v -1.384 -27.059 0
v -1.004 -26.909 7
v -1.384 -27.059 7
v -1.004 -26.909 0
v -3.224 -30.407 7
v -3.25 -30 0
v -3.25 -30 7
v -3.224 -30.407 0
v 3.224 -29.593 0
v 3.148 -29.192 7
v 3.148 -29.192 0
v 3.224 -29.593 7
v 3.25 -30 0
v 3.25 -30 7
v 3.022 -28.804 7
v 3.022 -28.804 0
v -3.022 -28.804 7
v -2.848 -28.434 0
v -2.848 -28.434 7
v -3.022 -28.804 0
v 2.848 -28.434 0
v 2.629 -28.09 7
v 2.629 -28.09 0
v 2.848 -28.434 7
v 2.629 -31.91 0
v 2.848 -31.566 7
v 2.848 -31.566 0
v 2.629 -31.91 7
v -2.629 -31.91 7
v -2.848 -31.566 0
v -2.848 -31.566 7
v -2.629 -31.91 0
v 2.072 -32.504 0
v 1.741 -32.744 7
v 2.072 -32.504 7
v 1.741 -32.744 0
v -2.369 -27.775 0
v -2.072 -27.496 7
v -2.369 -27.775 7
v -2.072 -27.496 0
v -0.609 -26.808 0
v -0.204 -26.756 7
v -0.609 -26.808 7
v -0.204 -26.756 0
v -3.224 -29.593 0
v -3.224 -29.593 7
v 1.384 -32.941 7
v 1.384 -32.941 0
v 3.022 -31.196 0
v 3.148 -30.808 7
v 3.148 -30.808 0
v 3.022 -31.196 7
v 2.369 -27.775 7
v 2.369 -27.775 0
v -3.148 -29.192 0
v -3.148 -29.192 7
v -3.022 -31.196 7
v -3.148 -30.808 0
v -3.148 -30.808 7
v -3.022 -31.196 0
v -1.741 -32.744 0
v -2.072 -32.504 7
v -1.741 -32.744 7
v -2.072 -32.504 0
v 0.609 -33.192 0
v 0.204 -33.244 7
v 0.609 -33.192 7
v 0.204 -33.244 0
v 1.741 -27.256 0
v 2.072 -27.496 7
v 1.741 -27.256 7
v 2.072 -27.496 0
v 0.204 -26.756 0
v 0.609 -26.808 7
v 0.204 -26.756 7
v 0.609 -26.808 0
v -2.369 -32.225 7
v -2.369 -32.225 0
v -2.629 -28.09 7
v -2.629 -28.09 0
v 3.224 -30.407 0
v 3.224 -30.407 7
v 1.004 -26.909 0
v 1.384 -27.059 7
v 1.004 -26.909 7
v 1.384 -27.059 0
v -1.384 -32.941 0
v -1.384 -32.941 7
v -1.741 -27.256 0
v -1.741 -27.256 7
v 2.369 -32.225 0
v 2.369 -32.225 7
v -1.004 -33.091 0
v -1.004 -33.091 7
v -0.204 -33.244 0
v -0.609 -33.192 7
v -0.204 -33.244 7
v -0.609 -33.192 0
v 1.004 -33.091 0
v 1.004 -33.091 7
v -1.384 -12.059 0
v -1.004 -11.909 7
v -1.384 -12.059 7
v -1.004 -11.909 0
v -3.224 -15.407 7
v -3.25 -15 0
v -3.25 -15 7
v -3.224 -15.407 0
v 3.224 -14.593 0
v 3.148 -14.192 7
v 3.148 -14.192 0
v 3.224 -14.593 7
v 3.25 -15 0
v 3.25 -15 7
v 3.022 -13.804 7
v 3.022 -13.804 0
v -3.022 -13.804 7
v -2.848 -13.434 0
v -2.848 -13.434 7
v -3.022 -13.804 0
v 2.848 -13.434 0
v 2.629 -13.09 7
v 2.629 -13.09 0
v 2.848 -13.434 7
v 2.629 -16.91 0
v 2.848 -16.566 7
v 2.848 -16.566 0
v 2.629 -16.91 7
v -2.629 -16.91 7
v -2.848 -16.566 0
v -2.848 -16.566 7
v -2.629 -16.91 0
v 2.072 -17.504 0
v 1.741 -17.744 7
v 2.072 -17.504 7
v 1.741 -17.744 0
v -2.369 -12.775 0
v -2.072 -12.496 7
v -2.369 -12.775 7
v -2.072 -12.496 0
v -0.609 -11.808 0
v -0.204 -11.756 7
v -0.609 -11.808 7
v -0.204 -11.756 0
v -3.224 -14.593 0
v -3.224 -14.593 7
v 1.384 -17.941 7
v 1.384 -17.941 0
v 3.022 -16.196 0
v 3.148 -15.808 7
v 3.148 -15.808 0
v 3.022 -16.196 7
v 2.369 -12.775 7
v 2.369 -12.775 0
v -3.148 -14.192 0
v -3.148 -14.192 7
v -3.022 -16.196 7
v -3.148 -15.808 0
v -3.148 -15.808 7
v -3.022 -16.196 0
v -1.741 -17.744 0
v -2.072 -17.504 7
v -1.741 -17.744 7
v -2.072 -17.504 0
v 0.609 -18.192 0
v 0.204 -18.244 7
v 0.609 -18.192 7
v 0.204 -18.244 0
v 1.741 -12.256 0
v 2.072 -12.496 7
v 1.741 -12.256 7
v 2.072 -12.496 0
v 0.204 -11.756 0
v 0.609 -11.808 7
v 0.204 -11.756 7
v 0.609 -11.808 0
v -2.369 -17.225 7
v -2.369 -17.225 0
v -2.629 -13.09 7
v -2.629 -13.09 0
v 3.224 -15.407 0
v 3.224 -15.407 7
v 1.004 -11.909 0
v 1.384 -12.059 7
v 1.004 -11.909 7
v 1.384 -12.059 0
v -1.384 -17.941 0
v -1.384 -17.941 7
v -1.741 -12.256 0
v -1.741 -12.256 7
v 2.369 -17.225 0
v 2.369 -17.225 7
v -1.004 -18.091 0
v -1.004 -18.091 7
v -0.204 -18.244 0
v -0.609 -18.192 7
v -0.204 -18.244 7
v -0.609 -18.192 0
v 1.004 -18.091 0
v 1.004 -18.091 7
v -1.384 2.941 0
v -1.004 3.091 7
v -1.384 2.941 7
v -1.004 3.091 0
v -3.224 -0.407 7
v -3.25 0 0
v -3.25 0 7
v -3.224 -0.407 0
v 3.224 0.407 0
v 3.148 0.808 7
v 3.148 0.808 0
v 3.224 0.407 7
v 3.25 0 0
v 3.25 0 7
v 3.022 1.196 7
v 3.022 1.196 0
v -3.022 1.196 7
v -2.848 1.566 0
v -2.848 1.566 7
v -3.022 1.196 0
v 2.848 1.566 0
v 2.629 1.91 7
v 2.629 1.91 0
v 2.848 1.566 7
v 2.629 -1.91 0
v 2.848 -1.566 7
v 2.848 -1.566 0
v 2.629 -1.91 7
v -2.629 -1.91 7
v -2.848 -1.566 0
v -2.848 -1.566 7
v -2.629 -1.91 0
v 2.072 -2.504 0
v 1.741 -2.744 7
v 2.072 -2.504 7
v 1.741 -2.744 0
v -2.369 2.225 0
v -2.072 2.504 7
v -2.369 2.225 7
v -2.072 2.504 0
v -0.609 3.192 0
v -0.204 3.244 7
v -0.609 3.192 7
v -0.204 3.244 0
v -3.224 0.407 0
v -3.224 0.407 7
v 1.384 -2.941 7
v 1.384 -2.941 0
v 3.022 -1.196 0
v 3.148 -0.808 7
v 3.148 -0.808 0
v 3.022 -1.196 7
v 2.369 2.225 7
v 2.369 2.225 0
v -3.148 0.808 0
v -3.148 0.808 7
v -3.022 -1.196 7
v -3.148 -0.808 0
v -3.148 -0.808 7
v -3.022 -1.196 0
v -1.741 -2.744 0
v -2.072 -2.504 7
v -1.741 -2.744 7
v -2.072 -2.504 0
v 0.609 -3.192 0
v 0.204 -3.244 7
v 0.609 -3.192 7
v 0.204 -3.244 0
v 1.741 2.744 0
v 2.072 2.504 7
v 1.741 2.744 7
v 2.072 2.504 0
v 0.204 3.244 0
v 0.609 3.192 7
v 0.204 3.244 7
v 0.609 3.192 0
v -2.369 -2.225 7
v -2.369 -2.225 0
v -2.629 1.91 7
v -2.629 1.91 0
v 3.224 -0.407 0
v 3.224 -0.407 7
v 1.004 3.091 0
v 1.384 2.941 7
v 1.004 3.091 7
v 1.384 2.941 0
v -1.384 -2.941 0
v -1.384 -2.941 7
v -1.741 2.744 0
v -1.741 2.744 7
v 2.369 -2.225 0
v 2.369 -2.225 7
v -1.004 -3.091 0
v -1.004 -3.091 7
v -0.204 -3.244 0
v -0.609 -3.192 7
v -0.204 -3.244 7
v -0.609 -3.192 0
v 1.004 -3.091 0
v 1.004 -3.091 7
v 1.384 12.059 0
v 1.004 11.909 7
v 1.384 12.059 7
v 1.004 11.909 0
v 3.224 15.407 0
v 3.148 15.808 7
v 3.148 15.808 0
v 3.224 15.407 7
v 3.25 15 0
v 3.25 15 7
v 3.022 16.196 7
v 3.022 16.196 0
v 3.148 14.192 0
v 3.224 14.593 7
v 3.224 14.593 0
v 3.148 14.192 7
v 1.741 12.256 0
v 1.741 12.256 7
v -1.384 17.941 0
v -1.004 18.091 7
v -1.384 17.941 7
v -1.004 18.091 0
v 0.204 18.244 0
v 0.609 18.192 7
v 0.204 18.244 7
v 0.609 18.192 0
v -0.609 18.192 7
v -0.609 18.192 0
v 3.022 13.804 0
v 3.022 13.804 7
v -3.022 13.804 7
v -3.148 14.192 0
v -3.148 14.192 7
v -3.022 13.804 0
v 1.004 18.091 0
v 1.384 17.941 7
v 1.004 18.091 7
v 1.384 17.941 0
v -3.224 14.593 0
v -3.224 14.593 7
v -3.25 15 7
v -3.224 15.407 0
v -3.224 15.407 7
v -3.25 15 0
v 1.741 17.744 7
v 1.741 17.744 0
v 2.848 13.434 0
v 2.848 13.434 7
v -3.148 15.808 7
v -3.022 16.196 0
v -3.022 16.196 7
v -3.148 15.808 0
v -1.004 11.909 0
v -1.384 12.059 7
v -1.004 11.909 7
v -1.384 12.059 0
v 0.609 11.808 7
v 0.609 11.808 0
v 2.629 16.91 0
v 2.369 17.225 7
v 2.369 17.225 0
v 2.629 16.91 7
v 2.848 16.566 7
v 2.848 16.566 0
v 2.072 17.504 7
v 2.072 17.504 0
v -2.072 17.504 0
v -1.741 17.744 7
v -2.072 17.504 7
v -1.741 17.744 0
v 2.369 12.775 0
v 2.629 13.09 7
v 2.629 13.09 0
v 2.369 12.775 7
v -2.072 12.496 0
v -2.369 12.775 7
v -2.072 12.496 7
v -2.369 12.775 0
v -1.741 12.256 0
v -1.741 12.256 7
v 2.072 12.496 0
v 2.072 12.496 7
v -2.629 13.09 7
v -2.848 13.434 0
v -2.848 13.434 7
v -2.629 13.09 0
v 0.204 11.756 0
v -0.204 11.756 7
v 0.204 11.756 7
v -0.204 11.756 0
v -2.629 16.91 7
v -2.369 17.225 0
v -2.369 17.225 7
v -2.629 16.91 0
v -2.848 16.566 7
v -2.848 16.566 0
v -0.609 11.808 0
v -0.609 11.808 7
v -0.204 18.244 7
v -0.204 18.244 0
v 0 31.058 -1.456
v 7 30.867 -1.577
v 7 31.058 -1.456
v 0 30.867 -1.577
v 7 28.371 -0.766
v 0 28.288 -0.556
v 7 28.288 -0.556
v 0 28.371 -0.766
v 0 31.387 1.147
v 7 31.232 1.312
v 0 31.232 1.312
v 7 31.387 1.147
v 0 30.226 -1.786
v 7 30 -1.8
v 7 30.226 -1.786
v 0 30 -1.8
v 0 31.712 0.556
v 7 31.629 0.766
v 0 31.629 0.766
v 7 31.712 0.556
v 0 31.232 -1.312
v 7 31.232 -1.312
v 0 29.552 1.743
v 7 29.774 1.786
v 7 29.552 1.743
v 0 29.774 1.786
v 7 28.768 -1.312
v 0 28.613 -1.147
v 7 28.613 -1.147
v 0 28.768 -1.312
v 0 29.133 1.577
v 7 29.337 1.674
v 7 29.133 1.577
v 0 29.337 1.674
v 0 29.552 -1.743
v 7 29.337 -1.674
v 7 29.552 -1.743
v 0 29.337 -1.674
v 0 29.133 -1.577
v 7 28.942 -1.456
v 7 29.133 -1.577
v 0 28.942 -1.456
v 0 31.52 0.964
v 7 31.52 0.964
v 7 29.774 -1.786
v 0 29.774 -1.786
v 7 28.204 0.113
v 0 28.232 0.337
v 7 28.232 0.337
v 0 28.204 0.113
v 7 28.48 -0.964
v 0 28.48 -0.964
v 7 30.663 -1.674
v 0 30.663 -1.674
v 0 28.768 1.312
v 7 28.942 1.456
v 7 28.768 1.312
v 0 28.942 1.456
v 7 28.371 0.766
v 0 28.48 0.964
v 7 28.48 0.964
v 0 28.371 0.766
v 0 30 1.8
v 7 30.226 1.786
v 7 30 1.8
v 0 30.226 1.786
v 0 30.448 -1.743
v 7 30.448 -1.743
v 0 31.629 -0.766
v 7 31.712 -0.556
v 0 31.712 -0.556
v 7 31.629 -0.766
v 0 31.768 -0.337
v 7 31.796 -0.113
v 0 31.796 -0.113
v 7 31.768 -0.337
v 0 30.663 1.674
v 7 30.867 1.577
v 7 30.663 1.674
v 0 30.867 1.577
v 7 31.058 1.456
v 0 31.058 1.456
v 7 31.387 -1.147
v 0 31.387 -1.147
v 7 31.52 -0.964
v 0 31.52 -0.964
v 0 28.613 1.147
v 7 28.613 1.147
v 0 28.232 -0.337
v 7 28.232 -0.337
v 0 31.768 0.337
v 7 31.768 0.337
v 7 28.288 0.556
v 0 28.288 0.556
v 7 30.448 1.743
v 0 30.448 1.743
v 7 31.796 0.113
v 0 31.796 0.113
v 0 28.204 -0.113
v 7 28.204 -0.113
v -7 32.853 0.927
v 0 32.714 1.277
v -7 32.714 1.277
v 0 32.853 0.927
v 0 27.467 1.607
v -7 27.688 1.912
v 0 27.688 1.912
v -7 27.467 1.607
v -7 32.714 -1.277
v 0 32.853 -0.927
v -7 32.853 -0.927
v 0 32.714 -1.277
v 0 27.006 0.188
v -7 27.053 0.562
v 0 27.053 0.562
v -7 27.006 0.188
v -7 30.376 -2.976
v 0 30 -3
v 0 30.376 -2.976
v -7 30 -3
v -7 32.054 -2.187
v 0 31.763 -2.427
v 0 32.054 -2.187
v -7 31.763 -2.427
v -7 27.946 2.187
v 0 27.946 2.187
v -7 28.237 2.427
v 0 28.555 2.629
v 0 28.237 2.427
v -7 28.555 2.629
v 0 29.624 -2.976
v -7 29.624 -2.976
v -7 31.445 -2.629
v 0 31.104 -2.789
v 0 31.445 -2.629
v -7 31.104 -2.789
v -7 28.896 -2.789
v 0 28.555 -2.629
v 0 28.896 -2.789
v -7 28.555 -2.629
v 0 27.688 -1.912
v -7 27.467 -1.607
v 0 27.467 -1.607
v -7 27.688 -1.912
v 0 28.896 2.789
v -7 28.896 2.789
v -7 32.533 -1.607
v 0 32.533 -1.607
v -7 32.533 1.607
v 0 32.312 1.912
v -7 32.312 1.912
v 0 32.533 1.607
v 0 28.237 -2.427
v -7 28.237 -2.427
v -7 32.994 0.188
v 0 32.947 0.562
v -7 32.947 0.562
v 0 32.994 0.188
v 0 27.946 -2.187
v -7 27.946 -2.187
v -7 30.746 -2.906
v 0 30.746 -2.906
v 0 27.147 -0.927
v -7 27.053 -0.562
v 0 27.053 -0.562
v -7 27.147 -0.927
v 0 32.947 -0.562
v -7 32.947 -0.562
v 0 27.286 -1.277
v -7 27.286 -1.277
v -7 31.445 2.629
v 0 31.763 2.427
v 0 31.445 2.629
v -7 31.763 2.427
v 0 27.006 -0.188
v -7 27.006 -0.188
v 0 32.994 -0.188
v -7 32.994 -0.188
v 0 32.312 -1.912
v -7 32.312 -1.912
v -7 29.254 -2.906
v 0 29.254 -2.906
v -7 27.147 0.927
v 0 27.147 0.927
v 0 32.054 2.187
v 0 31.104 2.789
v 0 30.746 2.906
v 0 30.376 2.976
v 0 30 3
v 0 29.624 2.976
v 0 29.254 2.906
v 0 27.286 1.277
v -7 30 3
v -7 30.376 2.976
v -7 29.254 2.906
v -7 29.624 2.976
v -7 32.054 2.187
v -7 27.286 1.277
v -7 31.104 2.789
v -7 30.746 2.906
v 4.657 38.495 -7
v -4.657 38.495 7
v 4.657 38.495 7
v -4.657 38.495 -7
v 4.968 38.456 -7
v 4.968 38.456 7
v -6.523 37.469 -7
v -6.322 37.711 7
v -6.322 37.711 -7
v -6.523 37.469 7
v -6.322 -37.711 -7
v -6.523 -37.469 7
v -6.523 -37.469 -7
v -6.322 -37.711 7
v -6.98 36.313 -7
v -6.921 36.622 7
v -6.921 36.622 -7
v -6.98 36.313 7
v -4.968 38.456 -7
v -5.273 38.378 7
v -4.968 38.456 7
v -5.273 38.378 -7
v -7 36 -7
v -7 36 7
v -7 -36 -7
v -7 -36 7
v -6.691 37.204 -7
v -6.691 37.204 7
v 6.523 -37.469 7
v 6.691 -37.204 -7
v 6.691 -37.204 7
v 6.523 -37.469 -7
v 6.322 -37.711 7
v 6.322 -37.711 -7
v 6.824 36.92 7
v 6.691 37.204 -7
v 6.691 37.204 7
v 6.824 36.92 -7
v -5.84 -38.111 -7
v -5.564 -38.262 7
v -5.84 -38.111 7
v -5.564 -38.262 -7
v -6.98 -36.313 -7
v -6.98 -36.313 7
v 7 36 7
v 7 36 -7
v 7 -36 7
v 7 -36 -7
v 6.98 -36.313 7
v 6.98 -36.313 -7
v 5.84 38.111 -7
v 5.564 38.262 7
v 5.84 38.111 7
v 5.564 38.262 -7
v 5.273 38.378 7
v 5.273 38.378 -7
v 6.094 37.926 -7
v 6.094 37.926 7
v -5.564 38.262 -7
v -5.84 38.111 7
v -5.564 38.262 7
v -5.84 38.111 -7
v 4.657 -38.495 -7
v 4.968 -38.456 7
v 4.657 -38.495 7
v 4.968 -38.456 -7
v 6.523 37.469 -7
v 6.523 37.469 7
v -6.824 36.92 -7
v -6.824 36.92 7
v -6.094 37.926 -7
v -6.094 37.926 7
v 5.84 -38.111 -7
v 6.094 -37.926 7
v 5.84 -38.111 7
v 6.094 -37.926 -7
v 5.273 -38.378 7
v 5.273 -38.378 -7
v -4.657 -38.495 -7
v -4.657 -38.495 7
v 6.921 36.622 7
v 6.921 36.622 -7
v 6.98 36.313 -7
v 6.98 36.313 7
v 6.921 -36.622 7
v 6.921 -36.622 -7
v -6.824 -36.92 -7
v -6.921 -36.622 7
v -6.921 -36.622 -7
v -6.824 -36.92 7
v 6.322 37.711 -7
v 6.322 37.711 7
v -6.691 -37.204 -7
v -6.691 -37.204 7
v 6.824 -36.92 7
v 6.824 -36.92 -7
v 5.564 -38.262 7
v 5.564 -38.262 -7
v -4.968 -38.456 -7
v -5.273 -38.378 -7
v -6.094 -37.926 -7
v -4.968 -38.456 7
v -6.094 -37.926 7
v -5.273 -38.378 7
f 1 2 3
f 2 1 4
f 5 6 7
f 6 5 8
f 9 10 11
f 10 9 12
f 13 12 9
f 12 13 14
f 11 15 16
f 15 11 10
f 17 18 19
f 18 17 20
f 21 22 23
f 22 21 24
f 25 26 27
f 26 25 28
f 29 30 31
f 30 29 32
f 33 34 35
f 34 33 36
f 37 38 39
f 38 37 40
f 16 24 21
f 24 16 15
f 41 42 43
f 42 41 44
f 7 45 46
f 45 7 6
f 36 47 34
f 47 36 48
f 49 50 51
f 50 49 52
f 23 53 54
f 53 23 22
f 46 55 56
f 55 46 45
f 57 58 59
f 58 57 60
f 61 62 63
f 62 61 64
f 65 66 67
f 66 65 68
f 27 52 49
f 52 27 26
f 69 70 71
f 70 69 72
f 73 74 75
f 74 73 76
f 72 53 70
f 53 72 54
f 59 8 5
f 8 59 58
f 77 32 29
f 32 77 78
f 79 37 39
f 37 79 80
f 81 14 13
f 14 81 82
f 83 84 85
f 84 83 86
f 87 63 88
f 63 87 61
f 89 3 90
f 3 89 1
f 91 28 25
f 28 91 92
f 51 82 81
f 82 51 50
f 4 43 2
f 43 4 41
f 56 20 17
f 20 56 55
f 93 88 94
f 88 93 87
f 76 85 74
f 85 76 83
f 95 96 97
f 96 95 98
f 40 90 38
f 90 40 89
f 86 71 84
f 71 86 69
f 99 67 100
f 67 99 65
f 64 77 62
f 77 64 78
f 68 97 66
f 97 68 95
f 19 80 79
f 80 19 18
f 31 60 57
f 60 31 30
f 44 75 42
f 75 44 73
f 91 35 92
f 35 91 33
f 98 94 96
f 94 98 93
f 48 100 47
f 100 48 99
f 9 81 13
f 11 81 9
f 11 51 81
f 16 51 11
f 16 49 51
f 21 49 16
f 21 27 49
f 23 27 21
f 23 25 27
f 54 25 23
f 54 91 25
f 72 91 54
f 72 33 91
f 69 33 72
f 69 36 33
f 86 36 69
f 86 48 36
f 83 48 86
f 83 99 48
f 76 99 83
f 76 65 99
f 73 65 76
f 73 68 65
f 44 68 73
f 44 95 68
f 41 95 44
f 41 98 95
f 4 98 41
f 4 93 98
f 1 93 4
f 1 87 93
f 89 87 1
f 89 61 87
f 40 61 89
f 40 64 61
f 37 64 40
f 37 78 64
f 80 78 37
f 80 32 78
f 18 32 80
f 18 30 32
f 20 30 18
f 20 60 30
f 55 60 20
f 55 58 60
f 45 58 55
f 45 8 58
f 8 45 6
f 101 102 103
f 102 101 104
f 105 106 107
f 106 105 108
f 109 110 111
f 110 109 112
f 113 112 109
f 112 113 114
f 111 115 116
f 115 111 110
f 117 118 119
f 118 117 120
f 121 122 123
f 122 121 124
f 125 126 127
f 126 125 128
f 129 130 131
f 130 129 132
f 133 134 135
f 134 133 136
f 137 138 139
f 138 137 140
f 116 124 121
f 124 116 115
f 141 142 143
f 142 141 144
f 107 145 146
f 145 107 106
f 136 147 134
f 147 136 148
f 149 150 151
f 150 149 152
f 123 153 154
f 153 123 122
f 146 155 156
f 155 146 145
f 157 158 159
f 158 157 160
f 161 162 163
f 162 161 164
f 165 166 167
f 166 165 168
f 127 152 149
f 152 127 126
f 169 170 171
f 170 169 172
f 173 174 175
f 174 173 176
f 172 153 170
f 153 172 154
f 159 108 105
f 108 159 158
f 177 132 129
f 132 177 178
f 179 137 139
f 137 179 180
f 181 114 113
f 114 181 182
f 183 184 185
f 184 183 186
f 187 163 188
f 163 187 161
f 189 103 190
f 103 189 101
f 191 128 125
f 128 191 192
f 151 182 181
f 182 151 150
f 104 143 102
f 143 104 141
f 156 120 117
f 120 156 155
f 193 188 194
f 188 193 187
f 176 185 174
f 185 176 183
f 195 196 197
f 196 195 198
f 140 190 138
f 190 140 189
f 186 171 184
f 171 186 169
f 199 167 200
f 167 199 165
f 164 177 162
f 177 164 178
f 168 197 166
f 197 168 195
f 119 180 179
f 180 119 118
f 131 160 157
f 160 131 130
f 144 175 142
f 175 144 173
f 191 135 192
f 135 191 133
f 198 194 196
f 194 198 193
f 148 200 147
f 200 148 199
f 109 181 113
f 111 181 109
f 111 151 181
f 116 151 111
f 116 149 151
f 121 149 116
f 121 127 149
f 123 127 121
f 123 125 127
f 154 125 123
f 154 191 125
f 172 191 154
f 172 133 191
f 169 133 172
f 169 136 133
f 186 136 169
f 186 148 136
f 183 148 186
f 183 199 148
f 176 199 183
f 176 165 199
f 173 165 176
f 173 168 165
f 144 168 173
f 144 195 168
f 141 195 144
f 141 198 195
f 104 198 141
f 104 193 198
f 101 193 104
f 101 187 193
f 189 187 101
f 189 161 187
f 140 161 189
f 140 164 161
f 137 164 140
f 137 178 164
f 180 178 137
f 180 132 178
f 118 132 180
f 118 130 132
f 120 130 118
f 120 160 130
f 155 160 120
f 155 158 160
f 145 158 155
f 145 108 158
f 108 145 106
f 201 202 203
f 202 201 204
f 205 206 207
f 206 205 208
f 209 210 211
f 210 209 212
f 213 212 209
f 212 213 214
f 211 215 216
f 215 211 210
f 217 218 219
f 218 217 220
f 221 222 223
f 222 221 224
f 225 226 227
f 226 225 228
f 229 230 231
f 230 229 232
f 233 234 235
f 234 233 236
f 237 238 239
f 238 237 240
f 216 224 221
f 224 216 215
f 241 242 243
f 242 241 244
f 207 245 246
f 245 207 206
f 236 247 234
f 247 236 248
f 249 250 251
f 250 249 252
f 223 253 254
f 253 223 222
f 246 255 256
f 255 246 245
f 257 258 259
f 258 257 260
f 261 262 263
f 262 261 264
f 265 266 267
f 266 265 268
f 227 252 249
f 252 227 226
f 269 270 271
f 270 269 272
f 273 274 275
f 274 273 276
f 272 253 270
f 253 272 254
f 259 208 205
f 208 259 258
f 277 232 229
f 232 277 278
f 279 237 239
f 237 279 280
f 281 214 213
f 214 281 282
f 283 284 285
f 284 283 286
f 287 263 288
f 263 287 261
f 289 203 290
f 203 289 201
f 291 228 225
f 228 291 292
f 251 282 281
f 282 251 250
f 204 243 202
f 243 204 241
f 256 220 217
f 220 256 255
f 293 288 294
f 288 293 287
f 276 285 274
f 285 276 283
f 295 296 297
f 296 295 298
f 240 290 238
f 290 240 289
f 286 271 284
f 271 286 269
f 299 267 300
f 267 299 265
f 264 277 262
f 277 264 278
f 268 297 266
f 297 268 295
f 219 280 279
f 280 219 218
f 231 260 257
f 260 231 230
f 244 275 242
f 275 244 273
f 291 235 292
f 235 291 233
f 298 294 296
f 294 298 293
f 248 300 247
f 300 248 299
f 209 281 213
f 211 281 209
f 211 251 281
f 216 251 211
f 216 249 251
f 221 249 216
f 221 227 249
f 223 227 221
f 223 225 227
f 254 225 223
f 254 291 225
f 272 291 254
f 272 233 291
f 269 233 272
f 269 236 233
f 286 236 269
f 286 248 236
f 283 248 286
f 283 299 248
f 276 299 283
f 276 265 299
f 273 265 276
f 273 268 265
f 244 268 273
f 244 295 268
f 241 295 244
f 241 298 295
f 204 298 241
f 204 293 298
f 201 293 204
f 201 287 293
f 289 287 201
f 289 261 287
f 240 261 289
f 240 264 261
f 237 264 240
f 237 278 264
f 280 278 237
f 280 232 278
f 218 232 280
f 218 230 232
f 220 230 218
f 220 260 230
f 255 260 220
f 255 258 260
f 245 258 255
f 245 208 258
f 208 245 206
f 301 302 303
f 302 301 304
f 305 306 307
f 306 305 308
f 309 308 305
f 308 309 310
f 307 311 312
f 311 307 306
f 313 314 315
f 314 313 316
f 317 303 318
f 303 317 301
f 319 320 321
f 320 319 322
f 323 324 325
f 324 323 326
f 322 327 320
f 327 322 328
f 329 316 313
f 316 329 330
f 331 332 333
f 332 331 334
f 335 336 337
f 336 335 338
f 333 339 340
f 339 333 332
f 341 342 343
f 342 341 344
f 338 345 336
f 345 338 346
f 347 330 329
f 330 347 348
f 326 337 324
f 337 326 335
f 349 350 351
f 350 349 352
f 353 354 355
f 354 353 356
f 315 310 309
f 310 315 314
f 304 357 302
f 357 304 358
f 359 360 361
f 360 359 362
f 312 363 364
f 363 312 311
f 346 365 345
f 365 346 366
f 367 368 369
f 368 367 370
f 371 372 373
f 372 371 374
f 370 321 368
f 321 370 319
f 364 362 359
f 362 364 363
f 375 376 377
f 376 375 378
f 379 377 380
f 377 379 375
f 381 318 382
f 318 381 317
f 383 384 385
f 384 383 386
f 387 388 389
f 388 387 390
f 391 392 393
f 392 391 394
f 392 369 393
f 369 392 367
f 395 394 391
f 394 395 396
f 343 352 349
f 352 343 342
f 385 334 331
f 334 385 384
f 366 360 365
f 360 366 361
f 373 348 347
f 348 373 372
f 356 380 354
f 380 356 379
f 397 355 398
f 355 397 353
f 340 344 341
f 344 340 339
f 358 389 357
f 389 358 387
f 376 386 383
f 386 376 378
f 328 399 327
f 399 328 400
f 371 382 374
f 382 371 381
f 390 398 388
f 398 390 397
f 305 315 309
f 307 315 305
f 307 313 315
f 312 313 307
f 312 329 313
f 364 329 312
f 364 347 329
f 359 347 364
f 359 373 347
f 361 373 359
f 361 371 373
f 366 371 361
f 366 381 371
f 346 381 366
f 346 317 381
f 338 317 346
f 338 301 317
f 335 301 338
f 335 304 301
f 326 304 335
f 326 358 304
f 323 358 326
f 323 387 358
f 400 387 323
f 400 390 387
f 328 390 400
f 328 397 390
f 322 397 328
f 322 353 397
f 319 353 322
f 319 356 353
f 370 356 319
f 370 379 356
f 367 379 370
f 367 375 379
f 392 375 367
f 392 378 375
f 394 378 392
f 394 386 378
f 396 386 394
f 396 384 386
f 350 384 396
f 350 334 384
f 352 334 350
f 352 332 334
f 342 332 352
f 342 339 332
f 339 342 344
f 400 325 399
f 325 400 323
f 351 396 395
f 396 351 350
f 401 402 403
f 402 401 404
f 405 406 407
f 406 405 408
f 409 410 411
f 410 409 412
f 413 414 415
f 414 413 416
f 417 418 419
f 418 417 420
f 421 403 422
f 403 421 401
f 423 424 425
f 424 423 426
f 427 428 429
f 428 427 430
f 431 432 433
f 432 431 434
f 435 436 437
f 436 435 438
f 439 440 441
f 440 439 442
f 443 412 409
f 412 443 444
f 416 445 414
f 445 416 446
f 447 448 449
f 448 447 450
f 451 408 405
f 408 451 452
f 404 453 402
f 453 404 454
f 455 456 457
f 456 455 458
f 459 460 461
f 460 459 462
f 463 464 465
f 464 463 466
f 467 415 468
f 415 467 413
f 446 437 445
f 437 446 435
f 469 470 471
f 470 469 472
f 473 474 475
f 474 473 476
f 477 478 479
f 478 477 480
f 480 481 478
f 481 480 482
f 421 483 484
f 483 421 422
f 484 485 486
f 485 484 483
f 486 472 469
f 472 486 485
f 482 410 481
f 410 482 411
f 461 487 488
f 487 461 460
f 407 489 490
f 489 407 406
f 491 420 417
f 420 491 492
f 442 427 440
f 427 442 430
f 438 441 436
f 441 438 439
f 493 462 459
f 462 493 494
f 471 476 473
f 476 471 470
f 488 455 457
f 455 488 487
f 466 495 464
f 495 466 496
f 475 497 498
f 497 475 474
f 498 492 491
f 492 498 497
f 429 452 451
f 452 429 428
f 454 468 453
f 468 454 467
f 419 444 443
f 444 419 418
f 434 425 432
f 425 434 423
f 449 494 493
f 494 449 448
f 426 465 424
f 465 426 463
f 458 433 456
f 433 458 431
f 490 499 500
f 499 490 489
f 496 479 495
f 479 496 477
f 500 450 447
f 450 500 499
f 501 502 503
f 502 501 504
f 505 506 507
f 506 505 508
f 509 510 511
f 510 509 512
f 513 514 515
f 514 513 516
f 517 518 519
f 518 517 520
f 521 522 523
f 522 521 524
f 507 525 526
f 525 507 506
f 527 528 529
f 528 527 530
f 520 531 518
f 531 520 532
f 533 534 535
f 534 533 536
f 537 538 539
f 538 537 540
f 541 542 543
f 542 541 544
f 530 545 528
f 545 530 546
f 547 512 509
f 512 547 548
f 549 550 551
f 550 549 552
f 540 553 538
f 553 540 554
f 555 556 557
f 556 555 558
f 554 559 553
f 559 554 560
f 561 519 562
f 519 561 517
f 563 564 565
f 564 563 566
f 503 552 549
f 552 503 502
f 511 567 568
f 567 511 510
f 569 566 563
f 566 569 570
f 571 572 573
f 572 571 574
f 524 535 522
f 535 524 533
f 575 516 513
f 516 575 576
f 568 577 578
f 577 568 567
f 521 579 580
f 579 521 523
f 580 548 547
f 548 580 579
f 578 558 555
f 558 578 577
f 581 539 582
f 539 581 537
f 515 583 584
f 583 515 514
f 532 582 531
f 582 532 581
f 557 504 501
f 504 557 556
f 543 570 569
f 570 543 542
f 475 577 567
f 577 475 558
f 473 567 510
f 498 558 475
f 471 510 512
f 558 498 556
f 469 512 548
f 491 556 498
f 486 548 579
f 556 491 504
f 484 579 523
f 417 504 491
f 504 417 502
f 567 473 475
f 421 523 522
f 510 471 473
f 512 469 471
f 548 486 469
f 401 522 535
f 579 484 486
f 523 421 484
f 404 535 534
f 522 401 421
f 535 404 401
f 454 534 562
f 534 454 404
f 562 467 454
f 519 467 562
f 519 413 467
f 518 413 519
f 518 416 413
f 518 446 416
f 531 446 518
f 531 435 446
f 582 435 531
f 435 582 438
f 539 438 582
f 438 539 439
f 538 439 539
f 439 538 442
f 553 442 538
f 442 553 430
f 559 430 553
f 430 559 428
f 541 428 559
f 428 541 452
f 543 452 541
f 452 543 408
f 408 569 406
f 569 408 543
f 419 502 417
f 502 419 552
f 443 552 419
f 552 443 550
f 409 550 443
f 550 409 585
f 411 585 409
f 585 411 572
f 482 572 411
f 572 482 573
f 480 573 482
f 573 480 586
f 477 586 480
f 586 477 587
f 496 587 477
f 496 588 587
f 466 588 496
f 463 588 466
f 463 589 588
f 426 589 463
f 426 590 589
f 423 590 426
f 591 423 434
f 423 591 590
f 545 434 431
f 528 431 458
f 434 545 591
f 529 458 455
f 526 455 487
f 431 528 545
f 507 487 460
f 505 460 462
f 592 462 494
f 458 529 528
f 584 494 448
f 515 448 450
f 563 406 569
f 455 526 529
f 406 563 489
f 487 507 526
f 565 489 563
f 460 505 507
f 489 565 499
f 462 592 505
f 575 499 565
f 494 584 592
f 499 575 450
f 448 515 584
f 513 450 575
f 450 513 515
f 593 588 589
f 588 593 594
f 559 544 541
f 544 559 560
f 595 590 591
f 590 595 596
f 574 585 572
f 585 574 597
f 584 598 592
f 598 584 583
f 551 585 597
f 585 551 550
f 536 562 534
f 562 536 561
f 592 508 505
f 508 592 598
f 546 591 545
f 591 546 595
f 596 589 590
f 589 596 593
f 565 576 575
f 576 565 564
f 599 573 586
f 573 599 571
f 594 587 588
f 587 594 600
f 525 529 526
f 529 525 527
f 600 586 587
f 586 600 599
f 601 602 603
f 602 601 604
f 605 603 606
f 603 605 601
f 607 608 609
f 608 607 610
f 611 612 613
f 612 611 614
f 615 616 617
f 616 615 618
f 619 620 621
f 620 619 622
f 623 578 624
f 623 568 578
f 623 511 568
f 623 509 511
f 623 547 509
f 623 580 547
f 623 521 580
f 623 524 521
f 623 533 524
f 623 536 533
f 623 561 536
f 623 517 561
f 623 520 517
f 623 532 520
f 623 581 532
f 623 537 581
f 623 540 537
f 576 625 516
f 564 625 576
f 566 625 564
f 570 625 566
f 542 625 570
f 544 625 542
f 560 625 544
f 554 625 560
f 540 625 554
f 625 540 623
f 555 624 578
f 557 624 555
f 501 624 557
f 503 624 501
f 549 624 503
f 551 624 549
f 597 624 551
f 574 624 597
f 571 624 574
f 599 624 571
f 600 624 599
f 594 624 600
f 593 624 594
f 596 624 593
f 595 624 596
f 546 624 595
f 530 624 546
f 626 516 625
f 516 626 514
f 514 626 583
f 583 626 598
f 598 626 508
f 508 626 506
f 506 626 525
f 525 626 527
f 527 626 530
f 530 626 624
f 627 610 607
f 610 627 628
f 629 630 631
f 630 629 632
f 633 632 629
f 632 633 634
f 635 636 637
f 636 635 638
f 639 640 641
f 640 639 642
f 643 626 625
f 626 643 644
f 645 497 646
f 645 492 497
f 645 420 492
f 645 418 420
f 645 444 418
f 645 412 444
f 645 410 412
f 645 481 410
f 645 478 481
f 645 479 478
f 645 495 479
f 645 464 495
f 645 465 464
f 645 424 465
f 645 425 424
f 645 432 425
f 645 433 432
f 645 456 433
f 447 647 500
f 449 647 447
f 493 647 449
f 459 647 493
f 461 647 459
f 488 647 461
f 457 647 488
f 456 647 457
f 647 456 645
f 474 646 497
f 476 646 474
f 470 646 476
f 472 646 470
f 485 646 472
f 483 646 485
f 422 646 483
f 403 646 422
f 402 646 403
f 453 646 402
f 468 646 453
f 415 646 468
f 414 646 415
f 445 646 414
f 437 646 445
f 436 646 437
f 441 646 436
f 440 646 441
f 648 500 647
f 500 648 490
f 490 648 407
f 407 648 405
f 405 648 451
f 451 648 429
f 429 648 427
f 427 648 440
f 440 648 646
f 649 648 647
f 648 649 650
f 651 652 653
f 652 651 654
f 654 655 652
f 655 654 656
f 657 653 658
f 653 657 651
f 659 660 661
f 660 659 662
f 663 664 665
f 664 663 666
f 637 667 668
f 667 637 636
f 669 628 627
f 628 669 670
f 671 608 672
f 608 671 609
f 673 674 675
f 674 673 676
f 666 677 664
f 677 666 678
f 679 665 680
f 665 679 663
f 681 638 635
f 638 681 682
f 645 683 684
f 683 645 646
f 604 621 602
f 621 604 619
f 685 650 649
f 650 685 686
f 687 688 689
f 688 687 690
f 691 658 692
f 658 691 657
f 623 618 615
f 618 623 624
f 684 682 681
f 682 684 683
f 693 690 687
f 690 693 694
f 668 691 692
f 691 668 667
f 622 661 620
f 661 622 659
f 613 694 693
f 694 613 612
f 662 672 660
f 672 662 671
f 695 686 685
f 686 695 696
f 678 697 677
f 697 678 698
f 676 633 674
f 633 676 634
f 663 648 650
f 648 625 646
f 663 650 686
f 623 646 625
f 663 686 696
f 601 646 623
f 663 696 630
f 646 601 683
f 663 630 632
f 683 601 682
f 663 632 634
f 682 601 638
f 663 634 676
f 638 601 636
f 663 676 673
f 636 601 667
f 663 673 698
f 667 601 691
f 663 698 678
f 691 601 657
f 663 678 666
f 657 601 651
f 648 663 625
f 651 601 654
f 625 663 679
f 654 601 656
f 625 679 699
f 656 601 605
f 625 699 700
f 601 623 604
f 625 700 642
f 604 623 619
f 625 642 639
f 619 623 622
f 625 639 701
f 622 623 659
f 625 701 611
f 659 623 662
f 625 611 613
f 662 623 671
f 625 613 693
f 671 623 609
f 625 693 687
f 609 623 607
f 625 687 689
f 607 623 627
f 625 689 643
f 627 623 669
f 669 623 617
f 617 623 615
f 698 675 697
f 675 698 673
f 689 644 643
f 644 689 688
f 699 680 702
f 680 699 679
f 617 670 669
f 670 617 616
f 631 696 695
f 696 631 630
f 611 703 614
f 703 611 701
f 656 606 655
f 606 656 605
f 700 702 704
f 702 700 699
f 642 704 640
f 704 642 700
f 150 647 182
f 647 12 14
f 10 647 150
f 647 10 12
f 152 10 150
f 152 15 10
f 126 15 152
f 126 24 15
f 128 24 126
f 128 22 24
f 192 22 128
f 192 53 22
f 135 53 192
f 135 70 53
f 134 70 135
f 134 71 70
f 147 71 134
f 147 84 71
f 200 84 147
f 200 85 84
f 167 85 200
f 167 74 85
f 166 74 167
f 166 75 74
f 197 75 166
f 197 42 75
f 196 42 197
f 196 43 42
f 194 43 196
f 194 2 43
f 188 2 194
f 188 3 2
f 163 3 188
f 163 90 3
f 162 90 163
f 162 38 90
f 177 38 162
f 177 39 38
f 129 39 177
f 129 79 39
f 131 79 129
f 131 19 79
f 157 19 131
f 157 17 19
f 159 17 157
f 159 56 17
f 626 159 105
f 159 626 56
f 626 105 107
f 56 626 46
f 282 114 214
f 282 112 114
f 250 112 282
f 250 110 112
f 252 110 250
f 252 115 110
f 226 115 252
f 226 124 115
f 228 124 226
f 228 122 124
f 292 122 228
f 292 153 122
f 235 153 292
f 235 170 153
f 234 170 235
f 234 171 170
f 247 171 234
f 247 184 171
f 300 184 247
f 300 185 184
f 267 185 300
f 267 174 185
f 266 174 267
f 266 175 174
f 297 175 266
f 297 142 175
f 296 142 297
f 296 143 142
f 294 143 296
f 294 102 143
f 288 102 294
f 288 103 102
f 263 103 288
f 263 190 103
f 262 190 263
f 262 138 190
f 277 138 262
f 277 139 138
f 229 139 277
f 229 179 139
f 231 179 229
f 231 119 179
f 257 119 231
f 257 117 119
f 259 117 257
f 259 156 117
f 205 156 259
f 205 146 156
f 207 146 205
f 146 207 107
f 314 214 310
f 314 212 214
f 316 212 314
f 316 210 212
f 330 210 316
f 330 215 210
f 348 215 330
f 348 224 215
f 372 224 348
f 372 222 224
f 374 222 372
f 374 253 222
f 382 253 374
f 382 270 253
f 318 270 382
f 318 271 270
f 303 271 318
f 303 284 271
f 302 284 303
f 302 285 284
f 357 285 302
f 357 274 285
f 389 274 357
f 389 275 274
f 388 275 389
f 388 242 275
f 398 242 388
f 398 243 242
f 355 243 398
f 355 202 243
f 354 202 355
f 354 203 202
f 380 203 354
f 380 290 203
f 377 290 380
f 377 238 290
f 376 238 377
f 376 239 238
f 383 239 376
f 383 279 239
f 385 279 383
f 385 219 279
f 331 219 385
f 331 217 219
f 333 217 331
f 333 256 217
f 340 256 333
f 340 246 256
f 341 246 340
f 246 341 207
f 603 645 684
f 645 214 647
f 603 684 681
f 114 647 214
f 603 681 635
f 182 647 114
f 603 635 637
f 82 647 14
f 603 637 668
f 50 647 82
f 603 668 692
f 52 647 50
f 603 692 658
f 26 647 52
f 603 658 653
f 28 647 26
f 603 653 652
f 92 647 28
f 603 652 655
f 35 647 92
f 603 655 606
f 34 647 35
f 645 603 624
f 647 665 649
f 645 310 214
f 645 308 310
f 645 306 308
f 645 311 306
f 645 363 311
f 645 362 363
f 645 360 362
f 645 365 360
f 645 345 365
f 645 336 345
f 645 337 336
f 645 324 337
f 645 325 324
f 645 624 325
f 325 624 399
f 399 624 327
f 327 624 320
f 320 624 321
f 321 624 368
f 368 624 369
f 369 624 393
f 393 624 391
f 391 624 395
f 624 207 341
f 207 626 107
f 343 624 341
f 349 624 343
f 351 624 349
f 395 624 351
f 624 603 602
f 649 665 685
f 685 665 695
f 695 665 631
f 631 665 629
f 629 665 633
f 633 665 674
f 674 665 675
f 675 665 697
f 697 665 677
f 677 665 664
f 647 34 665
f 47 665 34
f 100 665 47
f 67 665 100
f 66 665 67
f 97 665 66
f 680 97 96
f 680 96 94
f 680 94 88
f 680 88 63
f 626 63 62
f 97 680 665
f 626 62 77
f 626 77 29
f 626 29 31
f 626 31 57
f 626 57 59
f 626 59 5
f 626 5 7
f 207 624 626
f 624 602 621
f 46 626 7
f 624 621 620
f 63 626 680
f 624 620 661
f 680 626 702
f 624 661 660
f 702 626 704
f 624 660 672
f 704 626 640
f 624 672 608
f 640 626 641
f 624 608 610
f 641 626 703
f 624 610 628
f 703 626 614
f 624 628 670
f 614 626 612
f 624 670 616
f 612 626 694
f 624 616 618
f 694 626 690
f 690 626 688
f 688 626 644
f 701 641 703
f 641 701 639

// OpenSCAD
$fn = 50;


difference() {
	union() {
		translate(v = [0, 0, -7.0000000000]) {
			hull() {
				translate(v = [-4.5000000000, 36.0000000000, 0]) {
					cylinder(h = 14, r = 2.5000000000);
				}
				translate(v = [4.5000000000, 36.0000000000, 0]) {
					cylinder(h = 14, r = 2.5000000000);
				}
				translate(v = [-4.5000000000, -36.0000000000, 0]) {
					cylinder(h = 14, r = 2.5000000000);
				}
				translate(v = [4.5000000000, -36.0000000000, 0]) {
					cylinder(h = 14, r = 2.5000000000);
				}
			}
		}
	}
	union() {
		translate(v = [0.0000000000, -30.0000000000, 0]) {
			cylinder(h = 100, r = 3.2500000000);
		}
		translate(v = [0.0000000000, -15.0000000000, 0]) {
			cylinder(h = 100, r = 3.2500000000);
		}
		cylinder(h = 100, r = 3.2500000000);
		translate(v = [0.0000000000, 15.0000000000, 0]) {
			cylinder(h = 100, r = 3.2500000000);
		}
		translate(v = [-50, 30, 0]) {
			rotate(a = [0, 90, 0]) {
				cylinder(h = 100, r = 1.8000000000);
			}
		}
		translate(v = [-100, 30, 0]) {
			rotate(a = [0, 90, 0]) {
				cylinder(h = 100, r = 3.0000000000);
			}
		}
	}
}
